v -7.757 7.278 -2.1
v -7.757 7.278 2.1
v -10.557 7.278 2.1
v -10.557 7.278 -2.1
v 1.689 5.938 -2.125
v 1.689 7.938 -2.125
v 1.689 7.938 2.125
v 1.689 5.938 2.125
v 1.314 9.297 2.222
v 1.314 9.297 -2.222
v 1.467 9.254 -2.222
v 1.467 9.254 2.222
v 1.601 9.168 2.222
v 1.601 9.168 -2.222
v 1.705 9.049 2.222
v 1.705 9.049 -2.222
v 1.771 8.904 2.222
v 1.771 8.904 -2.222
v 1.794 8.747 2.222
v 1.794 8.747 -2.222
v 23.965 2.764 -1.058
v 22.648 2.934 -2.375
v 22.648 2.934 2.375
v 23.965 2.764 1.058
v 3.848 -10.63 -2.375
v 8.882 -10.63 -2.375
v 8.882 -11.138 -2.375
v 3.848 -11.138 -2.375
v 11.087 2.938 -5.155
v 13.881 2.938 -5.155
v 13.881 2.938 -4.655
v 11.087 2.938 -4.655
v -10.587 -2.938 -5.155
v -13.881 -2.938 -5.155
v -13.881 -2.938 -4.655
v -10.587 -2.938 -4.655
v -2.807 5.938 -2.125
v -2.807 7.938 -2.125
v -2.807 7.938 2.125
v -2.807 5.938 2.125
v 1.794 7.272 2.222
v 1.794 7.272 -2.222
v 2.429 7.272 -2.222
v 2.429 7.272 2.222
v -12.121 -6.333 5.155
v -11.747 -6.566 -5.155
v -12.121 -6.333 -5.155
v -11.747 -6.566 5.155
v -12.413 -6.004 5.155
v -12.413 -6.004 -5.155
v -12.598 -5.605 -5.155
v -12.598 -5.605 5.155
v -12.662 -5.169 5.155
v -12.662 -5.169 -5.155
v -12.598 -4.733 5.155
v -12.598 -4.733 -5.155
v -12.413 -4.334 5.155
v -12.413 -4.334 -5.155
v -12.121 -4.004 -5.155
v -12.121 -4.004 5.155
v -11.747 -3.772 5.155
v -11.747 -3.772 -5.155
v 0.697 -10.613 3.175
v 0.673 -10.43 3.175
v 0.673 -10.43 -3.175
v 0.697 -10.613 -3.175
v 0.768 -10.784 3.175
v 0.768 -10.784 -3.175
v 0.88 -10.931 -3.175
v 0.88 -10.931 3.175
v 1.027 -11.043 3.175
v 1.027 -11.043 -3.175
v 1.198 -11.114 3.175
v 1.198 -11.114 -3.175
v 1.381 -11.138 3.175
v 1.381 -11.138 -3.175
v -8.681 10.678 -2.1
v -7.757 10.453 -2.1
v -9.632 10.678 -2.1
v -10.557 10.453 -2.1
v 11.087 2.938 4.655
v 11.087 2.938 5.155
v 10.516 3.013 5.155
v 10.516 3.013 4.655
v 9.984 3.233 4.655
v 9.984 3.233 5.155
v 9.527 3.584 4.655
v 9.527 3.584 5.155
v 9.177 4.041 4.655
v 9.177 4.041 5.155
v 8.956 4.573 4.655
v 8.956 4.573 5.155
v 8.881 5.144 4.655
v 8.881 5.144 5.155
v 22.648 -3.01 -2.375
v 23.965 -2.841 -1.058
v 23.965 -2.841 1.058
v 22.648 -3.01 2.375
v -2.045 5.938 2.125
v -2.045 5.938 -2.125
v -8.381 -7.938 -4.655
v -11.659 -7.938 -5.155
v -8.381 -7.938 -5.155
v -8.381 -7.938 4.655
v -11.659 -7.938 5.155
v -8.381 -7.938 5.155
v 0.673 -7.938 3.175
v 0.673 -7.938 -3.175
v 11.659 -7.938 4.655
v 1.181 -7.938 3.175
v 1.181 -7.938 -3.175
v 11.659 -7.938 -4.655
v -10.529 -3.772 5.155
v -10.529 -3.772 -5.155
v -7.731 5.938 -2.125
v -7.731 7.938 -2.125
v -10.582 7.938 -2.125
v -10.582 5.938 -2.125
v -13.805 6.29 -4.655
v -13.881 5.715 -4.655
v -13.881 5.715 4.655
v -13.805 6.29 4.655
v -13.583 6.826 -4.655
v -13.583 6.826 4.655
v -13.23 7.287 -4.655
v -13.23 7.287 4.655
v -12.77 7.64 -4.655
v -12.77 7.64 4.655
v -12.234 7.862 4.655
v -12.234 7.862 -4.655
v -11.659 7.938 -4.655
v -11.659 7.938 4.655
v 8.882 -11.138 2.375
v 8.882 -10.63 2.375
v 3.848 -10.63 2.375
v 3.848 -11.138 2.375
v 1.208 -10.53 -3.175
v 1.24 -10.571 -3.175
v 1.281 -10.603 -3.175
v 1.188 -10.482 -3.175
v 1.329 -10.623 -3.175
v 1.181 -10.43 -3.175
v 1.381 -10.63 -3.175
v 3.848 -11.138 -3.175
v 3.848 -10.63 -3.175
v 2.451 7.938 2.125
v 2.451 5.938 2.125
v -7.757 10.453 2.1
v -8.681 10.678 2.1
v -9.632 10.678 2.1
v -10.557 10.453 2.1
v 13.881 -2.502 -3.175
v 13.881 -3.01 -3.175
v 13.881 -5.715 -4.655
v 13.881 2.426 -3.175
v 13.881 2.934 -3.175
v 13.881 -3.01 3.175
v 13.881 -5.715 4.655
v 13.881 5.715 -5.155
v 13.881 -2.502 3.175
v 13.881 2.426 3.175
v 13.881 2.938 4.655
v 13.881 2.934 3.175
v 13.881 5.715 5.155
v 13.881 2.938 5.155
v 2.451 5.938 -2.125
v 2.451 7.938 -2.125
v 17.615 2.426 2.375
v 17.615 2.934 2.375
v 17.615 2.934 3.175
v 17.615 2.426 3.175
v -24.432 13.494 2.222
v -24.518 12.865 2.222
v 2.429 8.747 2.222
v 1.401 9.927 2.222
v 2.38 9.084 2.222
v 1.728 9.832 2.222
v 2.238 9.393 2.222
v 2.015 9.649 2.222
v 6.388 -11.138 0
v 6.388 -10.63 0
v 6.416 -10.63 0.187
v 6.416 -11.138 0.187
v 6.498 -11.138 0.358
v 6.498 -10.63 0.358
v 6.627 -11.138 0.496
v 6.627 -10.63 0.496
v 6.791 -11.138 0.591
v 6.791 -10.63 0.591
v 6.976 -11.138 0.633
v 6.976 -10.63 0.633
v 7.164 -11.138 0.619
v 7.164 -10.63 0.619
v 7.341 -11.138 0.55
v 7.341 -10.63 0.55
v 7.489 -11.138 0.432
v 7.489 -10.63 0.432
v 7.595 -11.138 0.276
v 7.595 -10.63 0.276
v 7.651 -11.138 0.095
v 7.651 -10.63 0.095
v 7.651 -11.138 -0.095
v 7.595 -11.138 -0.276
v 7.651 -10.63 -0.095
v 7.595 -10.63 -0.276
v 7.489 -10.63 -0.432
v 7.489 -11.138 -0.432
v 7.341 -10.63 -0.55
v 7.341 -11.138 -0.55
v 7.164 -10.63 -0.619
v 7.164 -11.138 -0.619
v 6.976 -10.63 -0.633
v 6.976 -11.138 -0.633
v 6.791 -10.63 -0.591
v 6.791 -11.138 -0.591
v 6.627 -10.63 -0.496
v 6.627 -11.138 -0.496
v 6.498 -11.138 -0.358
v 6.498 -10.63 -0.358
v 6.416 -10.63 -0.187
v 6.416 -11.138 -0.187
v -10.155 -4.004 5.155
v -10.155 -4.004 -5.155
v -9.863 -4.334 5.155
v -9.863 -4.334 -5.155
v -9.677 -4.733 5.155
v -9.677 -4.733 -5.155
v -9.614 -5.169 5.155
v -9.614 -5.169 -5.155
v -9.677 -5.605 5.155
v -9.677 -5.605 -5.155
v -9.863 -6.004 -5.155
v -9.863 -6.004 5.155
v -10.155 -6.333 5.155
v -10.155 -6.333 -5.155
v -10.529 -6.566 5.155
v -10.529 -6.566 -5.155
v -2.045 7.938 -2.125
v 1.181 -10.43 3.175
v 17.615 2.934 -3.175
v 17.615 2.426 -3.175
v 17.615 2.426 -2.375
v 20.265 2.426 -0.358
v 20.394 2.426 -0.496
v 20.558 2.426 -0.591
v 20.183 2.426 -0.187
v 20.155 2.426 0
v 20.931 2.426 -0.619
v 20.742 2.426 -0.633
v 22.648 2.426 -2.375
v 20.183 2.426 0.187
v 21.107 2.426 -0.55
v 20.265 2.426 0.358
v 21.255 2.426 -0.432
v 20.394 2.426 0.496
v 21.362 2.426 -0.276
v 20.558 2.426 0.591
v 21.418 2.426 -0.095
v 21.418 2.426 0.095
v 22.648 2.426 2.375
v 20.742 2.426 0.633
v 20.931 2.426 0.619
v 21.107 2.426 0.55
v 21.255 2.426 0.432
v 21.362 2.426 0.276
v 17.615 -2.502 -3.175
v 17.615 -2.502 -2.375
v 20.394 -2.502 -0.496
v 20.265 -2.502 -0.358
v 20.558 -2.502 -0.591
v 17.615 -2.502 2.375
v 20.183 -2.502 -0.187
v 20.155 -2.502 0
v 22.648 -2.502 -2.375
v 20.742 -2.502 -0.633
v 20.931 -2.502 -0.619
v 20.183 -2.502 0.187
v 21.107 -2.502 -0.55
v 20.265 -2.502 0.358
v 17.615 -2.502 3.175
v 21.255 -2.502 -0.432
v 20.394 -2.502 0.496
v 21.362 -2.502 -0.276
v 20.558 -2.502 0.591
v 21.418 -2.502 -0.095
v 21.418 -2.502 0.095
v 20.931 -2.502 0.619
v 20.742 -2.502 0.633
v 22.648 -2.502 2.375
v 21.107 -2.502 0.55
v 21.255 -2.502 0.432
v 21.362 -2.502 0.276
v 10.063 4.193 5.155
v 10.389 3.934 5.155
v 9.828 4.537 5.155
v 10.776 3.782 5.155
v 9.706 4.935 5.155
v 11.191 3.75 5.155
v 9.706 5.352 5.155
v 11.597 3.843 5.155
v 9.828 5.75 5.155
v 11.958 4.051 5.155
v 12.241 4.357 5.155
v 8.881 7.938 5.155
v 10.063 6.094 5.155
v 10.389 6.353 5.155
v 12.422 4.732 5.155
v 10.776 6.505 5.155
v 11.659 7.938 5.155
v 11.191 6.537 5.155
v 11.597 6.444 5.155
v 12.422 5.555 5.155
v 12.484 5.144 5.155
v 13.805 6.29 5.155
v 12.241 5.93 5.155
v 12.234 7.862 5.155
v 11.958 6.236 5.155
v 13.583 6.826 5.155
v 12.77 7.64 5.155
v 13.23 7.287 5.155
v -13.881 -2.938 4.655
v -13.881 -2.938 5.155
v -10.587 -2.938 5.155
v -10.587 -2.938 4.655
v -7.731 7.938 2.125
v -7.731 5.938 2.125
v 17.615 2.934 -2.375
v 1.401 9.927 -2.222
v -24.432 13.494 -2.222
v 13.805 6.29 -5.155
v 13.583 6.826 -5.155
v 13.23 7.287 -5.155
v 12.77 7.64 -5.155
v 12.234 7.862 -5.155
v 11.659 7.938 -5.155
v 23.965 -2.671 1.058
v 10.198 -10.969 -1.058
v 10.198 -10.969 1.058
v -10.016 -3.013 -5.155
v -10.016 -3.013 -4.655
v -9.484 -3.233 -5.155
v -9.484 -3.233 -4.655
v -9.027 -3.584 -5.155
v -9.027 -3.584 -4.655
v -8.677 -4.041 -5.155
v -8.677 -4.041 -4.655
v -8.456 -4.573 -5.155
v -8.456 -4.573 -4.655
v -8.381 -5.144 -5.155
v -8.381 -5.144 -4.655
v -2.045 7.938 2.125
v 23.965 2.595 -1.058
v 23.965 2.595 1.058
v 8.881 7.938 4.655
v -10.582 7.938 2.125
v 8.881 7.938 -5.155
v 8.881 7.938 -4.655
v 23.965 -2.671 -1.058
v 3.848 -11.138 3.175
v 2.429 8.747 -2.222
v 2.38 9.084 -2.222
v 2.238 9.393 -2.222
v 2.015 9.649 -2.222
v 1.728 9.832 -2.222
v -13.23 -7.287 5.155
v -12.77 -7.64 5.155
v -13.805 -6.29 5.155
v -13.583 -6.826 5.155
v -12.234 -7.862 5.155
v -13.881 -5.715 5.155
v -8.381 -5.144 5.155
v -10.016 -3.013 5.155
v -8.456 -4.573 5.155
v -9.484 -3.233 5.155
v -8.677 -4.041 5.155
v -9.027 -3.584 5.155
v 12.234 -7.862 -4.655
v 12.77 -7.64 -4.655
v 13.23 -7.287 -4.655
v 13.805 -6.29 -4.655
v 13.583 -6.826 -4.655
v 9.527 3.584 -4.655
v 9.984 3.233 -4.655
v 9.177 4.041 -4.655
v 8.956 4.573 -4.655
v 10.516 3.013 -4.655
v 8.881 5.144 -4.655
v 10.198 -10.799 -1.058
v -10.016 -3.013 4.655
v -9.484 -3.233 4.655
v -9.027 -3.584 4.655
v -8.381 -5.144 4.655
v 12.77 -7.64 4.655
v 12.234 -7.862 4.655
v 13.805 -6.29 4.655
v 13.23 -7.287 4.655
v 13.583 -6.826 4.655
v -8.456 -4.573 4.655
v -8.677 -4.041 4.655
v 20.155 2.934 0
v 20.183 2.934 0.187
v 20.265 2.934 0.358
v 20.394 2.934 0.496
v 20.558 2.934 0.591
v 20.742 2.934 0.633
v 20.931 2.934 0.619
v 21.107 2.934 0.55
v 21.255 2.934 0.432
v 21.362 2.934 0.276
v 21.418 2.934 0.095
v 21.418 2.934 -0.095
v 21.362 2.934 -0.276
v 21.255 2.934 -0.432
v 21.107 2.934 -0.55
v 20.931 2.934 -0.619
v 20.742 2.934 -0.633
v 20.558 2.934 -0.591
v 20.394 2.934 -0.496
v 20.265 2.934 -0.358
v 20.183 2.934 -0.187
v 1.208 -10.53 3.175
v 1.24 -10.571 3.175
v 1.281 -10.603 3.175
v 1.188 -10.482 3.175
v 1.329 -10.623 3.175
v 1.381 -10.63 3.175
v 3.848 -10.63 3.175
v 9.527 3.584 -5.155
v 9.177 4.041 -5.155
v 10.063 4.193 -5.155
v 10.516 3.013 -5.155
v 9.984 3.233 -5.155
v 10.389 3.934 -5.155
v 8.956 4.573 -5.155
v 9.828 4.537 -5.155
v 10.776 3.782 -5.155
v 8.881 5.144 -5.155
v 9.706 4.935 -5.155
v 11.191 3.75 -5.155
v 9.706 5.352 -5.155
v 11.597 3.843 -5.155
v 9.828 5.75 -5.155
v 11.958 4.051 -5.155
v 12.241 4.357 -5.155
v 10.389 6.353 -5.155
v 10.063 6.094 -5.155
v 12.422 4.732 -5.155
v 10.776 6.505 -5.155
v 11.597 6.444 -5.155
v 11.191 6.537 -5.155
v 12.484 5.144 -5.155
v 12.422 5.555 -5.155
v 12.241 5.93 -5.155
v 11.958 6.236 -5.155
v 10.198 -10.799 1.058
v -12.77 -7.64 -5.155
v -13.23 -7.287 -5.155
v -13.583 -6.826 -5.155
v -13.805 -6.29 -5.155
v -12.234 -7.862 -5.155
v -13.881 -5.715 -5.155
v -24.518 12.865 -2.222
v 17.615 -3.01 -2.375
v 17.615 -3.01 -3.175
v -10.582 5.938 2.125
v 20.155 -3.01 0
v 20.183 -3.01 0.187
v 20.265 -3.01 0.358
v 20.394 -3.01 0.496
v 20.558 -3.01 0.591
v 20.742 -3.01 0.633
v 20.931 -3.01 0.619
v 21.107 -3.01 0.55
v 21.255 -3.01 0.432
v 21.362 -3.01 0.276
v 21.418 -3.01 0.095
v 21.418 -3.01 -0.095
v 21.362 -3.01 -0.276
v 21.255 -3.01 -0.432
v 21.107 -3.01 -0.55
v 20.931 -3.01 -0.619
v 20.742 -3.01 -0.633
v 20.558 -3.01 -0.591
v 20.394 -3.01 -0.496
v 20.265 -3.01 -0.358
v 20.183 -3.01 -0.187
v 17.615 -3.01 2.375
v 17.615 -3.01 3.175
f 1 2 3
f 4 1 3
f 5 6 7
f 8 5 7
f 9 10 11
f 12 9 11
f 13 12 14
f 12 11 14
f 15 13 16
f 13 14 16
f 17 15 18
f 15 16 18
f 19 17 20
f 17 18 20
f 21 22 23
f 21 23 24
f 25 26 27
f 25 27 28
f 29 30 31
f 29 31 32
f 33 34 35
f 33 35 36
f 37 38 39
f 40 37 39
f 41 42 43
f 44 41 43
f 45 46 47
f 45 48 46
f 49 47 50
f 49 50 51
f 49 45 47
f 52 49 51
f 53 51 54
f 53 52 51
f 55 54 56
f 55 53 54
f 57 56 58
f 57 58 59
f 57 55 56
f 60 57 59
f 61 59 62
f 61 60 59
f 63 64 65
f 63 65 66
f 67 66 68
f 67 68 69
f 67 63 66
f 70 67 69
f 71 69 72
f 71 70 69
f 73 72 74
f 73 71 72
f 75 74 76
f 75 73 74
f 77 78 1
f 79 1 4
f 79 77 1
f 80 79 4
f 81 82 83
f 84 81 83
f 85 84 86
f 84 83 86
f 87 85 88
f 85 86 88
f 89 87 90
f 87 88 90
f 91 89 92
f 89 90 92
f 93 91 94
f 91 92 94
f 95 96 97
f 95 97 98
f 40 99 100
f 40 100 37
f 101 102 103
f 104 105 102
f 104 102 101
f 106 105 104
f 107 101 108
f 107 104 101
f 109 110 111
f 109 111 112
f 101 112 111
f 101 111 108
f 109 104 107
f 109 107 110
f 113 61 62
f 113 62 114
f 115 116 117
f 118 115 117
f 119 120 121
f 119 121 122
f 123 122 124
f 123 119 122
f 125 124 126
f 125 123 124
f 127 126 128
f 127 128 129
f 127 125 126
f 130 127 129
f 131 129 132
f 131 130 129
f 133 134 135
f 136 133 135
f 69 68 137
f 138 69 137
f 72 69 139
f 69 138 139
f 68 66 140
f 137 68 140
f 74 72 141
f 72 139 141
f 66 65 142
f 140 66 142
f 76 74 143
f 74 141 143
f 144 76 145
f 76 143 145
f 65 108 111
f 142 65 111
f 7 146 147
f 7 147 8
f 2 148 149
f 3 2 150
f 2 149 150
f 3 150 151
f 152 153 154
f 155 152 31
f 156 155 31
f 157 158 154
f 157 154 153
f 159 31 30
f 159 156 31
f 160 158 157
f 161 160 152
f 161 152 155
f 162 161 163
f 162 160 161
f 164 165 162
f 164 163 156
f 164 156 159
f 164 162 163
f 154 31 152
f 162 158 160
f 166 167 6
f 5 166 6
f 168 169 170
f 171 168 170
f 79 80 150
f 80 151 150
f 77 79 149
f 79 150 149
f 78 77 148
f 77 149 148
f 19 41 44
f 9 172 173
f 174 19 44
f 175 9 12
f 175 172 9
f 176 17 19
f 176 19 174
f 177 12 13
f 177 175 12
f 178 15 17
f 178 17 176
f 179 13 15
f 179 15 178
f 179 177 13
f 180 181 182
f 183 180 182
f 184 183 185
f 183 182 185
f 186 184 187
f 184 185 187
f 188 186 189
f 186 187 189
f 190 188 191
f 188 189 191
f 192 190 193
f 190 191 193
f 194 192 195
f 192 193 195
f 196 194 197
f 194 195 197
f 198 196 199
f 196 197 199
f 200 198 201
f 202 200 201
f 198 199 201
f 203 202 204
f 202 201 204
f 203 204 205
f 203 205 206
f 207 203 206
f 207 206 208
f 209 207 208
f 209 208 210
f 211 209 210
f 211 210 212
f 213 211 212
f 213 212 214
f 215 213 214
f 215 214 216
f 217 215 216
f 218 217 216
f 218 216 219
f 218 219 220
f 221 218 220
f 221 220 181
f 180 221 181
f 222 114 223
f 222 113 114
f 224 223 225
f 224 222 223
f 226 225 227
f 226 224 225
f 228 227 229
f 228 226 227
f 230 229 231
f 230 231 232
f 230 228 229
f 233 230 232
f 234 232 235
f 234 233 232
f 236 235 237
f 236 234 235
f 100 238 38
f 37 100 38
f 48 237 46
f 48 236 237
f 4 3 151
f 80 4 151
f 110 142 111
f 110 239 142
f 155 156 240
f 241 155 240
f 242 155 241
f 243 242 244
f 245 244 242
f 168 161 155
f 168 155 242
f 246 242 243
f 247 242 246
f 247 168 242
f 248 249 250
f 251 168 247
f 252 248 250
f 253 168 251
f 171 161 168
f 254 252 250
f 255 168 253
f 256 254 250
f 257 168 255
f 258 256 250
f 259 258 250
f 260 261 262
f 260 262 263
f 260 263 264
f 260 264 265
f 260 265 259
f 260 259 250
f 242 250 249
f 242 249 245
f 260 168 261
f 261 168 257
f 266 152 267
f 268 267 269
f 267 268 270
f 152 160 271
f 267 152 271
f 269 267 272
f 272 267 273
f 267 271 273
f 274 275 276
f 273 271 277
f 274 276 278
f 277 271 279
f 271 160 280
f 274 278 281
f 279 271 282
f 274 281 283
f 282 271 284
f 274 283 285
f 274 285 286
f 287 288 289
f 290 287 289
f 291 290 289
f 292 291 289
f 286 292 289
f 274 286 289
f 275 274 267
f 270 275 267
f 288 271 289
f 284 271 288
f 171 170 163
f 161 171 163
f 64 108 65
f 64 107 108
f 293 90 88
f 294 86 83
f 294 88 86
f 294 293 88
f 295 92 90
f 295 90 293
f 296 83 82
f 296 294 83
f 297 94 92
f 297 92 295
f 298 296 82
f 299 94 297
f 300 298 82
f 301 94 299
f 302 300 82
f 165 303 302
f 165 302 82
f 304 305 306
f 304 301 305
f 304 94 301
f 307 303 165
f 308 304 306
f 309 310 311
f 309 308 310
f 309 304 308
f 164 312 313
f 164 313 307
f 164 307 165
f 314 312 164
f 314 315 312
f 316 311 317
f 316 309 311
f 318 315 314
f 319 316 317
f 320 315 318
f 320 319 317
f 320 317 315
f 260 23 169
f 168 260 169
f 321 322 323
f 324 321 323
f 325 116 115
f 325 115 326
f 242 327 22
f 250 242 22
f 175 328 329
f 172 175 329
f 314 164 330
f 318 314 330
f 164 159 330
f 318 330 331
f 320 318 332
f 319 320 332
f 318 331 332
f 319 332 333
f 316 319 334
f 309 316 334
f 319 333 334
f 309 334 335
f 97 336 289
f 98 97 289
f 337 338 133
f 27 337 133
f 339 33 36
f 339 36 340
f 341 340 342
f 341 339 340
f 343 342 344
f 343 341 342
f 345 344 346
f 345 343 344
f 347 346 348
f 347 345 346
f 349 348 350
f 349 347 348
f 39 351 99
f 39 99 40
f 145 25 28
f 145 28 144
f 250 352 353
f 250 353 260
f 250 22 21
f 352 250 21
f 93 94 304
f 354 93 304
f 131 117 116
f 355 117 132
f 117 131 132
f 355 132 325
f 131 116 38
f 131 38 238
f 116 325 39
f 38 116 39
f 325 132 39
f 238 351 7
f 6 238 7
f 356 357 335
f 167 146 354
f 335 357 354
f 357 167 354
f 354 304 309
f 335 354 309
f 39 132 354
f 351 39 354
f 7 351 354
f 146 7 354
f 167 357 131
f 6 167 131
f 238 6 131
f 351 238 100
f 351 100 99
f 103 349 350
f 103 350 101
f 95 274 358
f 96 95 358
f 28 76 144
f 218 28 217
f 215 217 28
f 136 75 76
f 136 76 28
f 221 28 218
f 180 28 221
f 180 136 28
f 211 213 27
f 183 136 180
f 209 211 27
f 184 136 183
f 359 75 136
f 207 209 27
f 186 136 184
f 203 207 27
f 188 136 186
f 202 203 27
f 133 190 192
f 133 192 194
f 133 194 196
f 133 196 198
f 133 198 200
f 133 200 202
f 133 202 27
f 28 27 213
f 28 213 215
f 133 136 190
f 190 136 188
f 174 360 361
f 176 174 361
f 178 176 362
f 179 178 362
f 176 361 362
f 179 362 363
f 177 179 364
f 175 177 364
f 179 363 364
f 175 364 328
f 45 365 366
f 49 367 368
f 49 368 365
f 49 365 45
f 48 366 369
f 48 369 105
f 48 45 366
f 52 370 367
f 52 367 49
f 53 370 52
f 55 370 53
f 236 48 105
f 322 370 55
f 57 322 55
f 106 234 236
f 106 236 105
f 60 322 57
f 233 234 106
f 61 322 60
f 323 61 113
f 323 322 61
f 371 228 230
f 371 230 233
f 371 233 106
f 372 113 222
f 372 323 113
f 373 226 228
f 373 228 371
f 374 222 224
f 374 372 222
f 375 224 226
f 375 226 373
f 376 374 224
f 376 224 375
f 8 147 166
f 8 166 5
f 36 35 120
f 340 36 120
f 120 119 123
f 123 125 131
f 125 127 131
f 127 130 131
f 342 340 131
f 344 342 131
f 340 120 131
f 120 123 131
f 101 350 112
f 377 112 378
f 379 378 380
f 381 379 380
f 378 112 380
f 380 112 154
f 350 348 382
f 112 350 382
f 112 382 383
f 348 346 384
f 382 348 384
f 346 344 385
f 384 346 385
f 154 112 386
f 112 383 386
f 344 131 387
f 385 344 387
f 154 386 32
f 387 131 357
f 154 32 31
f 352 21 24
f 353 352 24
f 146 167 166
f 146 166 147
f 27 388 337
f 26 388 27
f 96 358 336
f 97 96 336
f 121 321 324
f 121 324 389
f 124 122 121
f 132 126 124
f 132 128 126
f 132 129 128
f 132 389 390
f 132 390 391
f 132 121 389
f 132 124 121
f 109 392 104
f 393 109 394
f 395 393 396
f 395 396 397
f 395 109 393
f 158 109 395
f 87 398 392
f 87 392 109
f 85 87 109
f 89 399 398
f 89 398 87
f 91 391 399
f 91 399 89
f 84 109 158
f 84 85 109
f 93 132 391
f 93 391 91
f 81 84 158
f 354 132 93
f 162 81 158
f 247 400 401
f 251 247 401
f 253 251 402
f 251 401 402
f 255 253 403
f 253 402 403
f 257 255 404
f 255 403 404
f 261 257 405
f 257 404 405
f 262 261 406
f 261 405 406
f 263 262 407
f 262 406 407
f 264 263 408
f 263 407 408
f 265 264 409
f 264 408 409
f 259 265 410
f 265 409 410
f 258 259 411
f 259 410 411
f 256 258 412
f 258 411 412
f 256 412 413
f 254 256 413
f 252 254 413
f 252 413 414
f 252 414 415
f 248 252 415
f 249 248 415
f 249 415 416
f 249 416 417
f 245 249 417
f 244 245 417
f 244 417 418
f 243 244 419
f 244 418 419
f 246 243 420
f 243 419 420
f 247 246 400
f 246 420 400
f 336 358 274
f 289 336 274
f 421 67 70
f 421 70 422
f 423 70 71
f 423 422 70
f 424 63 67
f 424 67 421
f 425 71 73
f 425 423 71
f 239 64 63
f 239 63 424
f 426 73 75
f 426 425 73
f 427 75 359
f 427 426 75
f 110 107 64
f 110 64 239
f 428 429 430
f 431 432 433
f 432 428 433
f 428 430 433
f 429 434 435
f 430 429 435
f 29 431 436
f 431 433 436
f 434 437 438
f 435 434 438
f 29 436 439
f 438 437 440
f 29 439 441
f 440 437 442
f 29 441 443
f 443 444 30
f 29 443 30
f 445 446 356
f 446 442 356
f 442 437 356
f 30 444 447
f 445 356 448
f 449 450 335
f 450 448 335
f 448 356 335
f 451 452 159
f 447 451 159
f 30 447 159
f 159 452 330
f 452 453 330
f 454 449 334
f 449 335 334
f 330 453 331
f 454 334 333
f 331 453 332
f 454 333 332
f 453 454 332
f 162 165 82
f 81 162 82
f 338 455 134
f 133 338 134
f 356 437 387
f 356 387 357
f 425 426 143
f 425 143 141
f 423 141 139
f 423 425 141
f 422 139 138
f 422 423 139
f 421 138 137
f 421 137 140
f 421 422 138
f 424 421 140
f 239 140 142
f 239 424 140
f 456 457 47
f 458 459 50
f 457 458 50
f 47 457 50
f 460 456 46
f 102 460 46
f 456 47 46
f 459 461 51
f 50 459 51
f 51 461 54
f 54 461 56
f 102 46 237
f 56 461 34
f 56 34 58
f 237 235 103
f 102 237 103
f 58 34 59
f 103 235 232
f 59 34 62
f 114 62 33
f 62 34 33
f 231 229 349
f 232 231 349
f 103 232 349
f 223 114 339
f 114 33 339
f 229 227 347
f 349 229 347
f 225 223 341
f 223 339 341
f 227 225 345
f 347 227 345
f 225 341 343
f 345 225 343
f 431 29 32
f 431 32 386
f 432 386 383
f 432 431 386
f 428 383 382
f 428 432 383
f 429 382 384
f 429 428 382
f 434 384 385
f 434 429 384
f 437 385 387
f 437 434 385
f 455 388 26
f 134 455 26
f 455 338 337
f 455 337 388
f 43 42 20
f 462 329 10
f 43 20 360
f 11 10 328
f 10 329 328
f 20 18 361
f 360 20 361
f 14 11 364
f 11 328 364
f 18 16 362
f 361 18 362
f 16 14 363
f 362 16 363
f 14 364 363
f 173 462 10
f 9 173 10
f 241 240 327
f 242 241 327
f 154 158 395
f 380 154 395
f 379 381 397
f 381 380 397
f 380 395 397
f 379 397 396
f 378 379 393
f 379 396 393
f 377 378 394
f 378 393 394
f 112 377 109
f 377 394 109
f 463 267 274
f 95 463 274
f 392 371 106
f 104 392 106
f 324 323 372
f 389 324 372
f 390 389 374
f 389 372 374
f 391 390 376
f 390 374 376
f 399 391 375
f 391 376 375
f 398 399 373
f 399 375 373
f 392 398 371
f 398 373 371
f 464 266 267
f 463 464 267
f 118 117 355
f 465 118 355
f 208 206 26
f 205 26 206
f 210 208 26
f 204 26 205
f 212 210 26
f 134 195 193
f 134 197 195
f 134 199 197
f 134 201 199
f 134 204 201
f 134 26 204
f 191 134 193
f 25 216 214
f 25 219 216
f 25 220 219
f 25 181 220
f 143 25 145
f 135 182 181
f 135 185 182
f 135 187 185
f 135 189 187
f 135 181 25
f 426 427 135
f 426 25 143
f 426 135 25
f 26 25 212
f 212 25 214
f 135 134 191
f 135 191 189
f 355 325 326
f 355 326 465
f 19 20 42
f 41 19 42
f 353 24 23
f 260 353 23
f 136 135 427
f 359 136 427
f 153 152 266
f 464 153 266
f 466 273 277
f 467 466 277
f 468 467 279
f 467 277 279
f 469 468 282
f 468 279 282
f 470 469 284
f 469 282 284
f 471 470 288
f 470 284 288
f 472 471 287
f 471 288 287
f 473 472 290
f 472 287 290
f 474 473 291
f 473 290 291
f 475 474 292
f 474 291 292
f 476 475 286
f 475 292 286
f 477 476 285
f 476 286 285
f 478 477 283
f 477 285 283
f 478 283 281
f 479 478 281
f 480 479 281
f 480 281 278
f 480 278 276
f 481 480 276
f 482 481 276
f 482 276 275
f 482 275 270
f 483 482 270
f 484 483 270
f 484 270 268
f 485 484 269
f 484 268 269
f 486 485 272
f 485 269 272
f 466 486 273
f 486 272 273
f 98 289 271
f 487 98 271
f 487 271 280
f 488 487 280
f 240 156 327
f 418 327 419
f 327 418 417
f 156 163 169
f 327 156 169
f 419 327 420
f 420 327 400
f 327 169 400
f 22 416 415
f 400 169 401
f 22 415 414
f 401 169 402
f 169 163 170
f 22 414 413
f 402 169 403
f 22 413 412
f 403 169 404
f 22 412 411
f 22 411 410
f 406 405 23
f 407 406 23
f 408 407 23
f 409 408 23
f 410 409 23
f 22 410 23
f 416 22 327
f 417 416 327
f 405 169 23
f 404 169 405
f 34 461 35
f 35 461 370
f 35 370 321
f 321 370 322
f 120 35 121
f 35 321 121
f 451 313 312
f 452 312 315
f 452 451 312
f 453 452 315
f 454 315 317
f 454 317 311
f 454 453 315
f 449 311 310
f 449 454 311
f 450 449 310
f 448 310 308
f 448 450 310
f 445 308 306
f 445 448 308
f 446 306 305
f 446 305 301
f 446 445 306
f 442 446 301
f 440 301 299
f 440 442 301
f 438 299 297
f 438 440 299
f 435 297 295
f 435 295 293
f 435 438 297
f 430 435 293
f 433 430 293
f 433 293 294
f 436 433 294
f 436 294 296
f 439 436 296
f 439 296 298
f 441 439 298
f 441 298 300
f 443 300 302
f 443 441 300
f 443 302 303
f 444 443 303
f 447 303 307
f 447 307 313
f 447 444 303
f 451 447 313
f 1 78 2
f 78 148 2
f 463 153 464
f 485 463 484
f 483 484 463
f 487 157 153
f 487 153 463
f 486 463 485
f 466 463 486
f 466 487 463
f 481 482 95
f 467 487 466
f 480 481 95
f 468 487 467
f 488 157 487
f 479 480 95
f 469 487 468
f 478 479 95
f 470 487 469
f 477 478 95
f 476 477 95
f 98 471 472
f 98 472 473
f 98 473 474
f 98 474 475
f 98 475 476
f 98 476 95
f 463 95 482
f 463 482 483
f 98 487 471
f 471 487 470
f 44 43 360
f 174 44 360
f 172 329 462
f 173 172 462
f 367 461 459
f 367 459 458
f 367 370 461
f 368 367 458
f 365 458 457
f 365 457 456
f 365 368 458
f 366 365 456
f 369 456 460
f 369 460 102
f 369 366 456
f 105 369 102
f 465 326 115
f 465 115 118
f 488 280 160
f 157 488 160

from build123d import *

# Parameters (mm, degrees)
SKETCH1_W               = 27.7622
SKETCH1_H               = 15.875
SKETCH1_R               = 1.397
EXTRUDE1_DEPTH          = 5.155
FILLET1_R               = 2.2225
EXTRUDE2_DEPTH          = 2.1
SKETCH3_W               = 2.8508
SKETCH3_H               = 4.2508
SKETCH3_W_2             = 0.762
CUT_EXTRUDE1_DEPTH      = 2
CUT_EXTRUDE2_DEPTH      = 0.5
EXTRUDE3_DEPTH          = 3.175
SKETCH6_R               = 0.635
CUT_EXTRUDE3_DEPTH      = 26.970827061
EXTRUDE4_START          = -5.0038
SKETCH8_R               = 0.635
EXTRUDE4_DEPTH          = 0.508
LPATTERN1_COUNT         = 2
LPATTERN1_PITCH         = 5.4356
CUT_EXTRUDE4_DEPTH      = 27.924770629
CUT_EXTRUDE4_DEPTH_BACK = 27.924770629
LEVER2A_START           = -2.2225
LEVER2A_DEPTH           = 4.445


# Read off the part's stored shape, not the designer's step: Lever2a
with BuildPart() as part:
    # Sketch1 → Extrude1 (new, symmetric)
    with BuildSketch(Plane.XY):
        Rectangle(SKETCH1_W, SKETCH1_H)
        with Locations((11.0871, 5.1435)):
            Circle(SKETCH1_R, mode=Mode.SUBTRACT)
        with BuildLine():
            Line((-11.746970603, -3.7719), (-10.528829397, -3.7719))
            ThreePointArc((-10.528829397, -3.7719), (-9.6139, -5.1689), (-10.528829397, -6.5659))
            Line((-10.528829397, -6.5659), (-11.746970603, -6.5659))
            ThreePointArc((-11.746970603, -6.5659), (-12.6619, -5.1689), (-11.746970603, -3.7719))
        make_face(mode=Mode.SUBTRACT)
    extrude(amount=EXTRUDE1_DEPTH, both=True)

    # Fillet1
    fillet1_edges = [part.edges().sort_by_distance(p)[0] for p in [
        (-13.8811, 7.9375, 0),
        (13.8811, 7.9375, 0),
        (13.8811, -7.9375, 0),
        (-13.8811, -7.9375, 0),
    ]]
    fillet(fillet1_edges, radius=FILLET1_R)

    # Sketch3 → Cut-Extrude1 (cut)
    with BuildSketch(Plane(origin=(0, 7.9375, 0), x_dir=(-1, 0, 0), z_dir=(0, 1, 0))):
        with Locations((9.1567, 0)):
            Rectangle(SKETCH3_W, SKETCH3_H)
        with Locations((2.4257, 0)):
            Rectangle(SKETCH3_W_2, SKETCH3_H)
        with Locations((-2.0701, 0)):
            Rectangle(SKETCH3_W_2, SKETCH3_H)
    extrude(amount=-CUT_EXTRUDE1_DEPTH, mode=Mode.SUBTRACT)

    # Sketch4 → Cut-Extrude2 (cut)
    with BuildSketch(Plane.XY.offset(5.155)):
        with BuildLine():
            Line((-8.3811, -7.9375), (13.8811, -7.9375))
            Line((13.8811, -7.9375), (13.8811, 2.9375))
            Line((13.8811, 2.9375), (11.0871, 2.9375))
            ThreePointArc((11.0871, 2.9375), (9.527222441, 3.583622441), (8.8811, 5.1435))
            Line((8.8811, 5.1435), (8.8811, 7.9375))
            Line((8.8811, 7.9375), (-13.8811, 7.9375))
            Line((-13.8811, 7.9375), (-13.8811, -2.9375))
            Line((-13.8811, -2.9375), (-10.5871, -2.9375))
            ThreePointArc((-10.5871, -2.9375), (-9.027222441, -3.583622441), (-8.3811, -5.1435))
            Line((-8.3811, -5.1435), (-8.3811, -7.9375))
        make_face()
    cut_extrude2 = extrude(amount=-CUT_EXTRUDE2_DEPTH, mode=Mode.SUBTRACT)

    # Mirror1: Cut-Extrude2 across plane
    add(cut_extrude2.mirror(Plane.XY), mode=Mode.SUBTRACT)

    # Sketch5 → Extrude3 (add, symmetric)
    with BuildSketch(Plane.XY):
        with BuildLine():
            Line((0.6731, -7.9375), (0.6731, -10.4299))
            ThreePointArc((0.6731, -10.4299), (0.880468399, -10.930531601), (1.3811, -11.1379))
            Line((1.3811, -11.1379), (10.1981, -11.1379))
            Line((10.1981, -11.1379), (10.1981, -10.6299))
            Line((10.1981, -10.6299), (1.3811, -10.6299))
            ThreePointArc((1.3811, -10.6299), (1.239678644, -10.571321356), (1.1811, -10.4299))
            Line((1.1811, -10.4299), (1.1811, -7.9375))
            Line((1.1811, -7.9375), (0.6731, -7.9375))
        make_face()
    extrude(amount=EXTRUDE3_DEPTH, both=True)

    # Sketch6 → Cut-Extrude3 (cut, through all)
    with BuildSketch(Plane(origin=(0, -10.6299, 0), x_dir=(-1, 0, 0), z_dir=(0, 1, 0))):
        with Locations((-7.0231, 0)):
            Circle(SKETCH6_R)
        Polygon((-10.1981, 1.058333333), (-8.881533333, 2.3749), (-3.8481, 2.3749), (-3.8481, 3.175), (-10.1981, 3.175), align=None)
        Polygon((-10.1981, -3.175), (-10.1981, -1.058333333), (-8.881533333, -2.3749), (-3.8481, -2.3749), (-3.8481, -3.175), align=None)
    extrude(amount=-CUT_EXTRUDE3_DEPTH, mode=Mode.SUBTRACT)

    # Sketch8 → Extrude4 (add)
    with BuildSketch(Plane(origin=(0, 7.9375, 0), x_dir=(-1, 0, 0), z_dir=(0, 1, 0)).offset(EXTRUDE4_START)):
        Polygon((-13.8811, -3.175), (-17.6149, -3.175), (-17.6149, -2.3749), (-22.648333333, -2.3749), (-23.9649, -1.058333333), (-23.9649, 1.058333333), (-22.648333333, 2.3749), (-17.6149, 2.3749), (-17.6149, 3.175), (-13.8811, 3.175), align=None)
        with Locations((-20.7899, 0)):
            Circle(SKETCH8_R, mode=Mode.SUBTRACT)
    extrude4 = extrude(amount=-EXTRUDE4_DEPTH)

    # LPattern1: Extrude4 ×2
    with Locations(*[(0, -i * LPATTERN1_PITCH, 0) for i in range(1, LPATTERN1_COUNT)]):
        add(extrude4)

    # Sketch7 → Cut-Extrude4 (cut, two sides: drawn at the far end of the back side and taken through both)
    with BuildSketch(Plane.XY.offset(-CUT_EXTRUDE4_DEPTH_BACK)):
        Polygon((8.881533333, -10.6299), (10.1981, -10.6299), (10.1981, -10.799233333), align=None)
        Polygon((8.881533333, -11.1379), (10.1981, -11.1379), (10.1981, -10.968566667), align=None)
        Polygon((22.648333333, 2.9337), (23.9649, 2.764366667), (23.9649, 2.9337), align=None)
        Polygon((23.9649, 2.595033333), (22.648333333, 2.4257), (23.9649, 2.4257), align=None)
        Polygon((22.648333333, -2.5019), (23.9649, -2.5019), (23.9649, -2.671233333), align=None)
        Polygon((23.9649, -2.840566667), (22.648333333, -3.0099), (23.9649, -3.0099), align=None)
    extrude(amount=CUT_EXTRUDE4_DEPTH + CUT_EXTRUDE4_DEPTH_BACK, mode=Mode.SUBTRACT)


with BuildPart() as body_2:
    # Sketch2 → Extrude2 (new, symmetric)
    with BuildSketch(Plane.XY):
        with BuildLine():
            Line((-10.5567, 7.278098799), (-10.5567, 10.453098799))
            ThreePointArc((-10.5567, 10.453098799), (-9.1567, 10.7061), (-7.7567, 10.453098799))
            Line((-7.7567, 10.453098799), (-7.7567, 7.278098799))
            Line((-7.7567, 7.278098799), (-10.5567, 7.278098799))
        make_face()
    extrude(amount=EXTRUDE2_DEPTH, both=True)


with BuildPart() as body_3:
    # Lever2a outline → Lever2a (new body)
    with BuildSketch(Plane.XY.offset(LEVER2A_START)):
        with BuildLine():
            Line((1.793875, 7.271748799), (2.428875, 7.271748799))
            Line((2.428875, 7.271748799), (2.428875, 8.747069475))
            ThreePointArc((2.428875, 8.747069475), (2.135886533, 9.529269286), (1.401118075, 9.926502339))
            Line((1.401118075, 9.926502339), (-24.431625, 13.49375))
            Line((-24.431625, 13.49375), (-24.518487973, 12.864719139))
            Line((-24.518487973, 12.864719139), (1.314255101, 9.297471479))
            ThreePointArc((1.314255101, 9.297471479), (1.657147049, 9.112096054), (1.793875, 8.747069475))
            Line((1.793875, 8.747069475), (1.793875, 7.271748799))
        make_face()
    extrude(amount=LEVER2A_DEPTH)


solid = Compound([part.part, body_2.part, body_3.part])
